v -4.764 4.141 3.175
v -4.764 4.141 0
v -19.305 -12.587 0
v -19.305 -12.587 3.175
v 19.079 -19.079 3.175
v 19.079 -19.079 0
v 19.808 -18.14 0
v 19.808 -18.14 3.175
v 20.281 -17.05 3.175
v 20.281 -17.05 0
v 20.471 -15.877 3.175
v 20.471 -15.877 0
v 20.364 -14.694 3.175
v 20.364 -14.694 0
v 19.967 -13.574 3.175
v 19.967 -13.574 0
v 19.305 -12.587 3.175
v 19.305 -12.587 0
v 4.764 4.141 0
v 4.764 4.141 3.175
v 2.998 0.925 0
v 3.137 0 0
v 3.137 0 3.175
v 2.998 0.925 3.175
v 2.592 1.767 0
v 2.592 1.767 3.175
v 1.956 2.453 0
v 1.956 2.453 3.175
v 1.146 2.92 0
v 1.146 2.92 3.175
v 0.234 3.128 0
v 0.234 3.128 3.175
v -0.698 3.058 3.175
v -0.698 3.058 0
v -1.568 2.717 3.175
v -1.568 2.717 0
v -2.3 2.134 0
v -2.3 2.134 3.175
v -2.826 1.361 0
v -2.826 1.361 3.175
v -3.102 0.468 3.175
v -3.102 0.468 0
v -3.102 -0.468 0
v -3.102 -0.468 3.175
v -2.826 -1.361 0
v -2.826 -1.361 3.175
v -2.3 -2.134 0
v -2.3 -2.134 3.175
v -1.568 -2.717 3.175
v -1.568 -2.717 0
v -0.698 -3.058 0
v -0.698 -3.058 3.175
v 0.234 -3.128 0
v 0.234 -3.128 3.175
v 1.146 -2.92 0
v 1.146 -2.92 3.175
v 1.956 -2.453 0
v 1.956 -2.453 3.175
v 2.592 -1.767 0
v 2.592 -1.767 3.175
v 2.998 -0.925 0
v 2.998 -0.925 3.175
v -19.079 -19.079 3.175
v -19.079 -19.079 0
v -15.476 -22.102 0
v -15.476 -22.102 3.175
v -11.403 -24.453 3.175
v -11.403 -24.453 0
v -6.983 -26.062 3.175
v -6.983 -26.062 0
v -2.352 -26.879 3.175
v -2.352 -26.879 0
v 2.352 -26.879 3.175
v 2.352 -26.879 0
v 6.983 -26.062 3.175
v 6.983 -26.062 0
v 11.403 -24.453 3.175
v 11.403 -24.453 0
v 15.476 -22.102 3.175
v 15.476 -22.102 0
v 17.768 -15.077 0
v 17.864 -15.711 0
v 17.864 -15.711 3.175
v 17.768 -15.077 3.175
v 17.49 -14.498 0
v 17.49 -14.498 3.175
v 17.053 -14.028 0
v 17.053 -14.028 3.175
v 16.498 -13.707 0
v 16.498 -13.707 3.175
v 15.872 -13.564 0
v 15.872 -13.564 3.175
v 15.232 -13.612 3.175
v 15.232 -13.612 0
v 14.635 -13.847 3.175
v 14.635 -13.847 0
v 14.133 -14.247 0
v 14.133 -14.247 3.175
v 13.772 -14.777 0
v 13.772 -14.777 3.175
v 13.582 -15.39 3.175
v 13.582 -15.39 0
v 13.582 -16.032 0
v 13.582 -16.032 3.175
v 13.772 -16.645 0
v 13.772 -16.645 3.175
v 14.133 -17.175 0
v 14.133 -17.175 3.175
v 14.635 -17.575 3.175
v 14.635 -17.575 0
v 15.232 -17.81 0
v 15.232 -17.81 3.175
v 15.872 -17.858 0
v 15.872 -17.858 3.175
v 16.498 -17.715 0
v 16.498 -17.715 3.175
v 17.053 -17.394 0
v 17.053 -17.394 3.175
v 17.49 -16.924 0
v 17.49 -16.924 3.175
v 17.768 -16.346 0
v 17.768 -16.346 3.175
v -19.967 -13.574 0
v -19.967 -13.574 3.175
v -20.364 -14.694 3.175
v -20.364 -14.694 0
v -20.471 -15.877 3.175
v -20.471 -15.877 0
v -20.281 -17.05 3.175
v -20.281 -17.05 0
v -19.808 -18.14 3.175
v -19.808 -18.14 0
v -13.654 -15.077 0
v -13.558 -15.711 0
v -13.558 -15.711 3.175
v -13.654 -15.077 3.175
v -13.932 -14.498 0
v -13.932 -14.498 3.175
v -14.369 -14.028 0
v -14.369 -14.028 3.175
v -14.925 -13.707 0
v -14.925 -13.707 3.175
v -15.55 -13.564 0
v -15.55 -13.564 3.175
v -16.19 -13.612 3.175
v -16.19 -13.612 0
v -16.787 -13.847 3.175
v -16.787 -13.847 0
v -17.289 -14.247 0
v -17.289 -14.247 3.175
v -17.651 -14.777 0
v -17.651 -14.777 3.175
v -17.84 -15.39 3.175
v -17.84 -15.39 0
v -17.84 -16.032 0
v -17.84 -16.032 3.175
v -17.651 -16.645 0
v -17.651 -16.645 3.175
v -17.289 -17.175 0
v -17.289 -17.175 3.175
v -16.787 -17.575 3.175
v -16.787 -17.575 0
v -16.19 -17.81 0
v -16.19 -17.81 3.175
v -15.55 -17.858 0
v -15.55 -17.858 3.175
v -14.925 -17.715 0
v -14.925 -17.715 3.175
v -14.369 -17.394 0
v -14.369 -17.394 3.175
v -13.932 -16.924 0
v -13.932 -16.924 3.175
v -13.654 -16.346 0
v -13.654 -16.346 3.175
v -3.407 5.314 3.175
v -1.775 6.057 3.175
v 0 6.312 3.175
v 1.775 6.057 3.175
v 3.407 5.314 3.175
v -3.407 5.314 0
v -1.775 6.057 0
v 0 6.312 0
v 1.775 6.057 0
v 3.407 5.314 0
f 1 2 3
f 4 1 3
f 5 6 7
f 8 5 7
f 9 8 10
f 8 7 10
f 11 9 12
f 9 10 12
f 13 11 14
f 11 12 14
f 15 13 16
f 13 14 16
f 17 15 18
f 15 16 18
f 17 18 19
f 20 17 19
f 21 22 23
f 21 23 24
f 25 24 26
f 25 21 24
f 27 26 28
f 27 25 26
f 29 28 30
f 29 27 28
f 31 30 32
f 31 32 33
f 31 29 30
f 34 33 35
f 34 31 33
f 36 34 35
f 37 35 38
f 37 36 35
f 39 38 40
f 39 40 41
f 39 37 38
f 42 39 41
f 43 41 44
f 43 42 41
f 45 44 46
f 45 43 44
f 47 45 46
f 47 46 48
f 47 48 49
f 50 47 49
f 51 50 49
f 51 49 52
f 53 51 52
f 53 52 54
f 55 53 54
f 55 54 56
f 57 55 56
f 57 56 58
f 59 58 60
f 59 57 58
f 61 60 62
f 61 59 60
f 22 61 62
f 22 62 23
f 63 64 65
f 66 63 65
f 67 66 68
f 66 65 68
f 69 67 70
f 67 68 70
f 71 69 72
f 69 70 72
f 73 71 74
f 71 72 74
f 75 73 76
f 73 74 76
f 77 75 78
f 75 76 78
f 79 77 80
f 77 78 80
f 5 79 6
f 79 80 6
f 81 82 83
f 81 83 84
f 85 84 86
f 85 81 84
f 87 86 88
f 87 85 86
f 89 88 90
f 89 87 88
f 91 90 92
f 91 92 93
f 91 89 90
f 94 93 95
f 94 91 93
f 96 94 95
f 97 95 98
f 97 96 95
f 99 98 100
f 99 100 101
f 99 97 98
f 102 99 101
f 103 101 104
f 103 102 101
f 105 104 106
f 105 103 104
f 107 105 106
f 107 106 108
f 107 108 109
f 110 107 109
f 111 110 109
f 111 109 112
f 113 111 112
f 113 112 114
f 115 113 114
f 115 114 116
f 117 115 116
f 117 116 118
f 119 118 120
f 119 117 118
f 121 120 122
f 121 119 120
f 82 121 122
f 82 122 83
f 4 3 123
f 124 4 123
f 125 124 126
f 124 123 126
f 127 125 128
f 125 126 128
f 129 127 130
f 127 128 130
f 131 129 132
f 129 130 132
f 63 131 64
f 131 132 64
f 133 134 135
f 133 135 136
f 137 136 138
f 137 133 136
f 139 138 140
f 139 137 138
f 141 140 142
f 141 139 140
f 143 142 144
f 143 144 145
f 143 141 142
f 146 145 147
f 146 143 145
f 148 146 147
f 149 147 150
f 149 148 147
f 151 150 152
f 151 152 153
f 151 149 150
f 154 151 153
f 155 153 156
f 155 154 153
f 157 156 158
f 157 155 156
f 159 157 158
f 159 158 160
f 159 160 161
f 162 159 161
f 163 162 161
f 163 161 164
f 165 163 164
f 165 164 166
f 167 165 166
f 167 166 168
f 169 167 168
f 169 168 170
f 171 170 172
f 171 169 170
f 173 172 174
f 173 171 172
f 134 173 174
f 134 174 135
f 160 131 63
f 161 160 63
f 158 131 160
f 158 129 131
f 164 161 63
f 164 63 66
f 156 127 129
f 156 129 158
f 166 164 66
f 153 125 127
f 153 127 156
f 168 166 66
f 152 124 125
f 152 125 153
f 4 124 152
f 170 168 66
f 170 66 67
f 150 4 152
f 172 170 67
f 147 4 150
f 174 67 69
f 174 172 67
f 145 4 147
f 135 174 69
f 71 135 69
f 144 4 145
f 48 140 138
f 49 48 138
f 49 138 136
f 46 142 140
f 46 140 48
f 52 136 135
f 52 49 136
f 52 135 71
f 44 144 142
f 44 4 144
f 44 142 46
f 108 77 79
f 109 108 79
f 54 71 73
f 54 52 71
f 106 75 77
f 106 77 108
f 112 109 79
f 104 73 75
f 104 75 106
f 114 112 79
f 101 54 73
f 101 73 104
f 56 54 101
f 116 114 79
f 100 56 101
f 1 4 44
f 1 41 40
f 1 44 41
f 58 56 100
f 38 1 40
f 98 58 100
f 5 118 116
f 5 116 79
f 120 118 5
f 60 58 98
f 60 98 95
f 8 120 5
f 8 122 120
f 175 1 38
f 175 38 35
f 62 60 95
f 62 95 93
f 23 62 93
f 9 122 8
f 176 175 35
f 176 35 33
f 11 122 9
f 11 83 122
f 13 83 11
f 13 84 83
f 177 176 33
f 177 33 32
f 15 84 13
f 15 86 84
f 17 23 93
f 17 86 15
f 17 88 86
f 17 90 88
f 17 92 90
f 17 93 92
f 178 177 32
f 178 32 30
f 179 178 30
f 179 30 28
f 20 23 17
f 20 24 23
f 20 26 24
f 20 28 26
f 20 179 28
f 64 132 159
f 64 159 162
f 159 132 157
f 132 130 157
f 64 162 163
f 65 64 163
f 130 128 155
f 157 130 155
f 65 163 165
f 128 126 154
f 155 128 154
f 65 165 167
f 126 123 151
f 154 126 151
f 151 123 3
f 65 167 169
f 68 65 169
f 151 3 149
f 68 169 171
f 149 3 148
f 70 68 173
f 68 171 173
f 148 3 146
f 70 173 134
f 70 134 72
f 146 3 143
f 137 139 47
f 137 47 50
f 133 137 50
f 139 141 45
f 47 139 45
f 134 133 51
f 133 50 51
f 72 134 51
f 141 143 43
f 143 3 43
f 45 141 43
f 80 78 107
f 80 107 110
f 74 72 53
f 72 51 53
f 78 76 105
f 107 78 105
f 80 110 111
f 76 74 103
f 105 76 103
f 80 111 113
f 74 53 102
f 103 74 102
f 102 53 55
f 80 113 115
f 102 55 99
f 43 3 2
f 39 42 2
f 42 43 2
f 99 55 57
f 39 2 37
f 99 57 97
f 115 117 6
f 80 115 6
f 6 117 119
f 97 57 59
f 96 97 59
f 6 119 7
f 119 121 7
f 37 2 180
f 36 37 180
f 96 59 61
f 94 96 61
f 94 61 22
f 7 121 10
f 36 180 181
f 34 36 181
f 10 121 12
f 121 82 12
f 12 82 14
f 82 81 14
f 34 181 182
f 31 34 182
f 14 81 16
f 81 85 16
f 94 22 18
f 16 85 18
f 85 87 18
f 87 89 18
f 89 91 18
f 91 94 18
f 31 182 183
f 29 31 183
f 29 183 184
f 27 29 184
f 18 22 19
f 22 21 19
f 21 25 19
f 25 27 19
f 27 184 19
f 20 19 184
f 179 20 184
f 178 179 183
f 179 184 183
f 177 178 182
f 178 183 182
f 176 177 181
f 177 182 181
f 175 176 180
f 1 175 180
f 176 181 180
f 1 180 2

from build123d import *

# Parameters (mm, degrees)
F0_R     = 2.15265
F0_R_2   = 3.1369
F1_DEPTH = 3.175


with BuildPart() as f1:
    # F0 (on Top) → F1 (new body)
    with BuildSketch(Plane.XY):
        with BuildLine():
            Line((19.305298, -12.586502), (4.763557, 4.141088))
            ThreePointArc((4.763557, 4.141088), (0, 6.3119), (-4.763557, 4.141088))
            Line((-4.763557, 4.141088), (-19.305298, -12.586502))
            ThreePointArc((-19.305298, -12.586502), (-20.470666, -15.87722), (-19.078661, -19.078661))
            ThreePointArc((-19.078661, -19.078661), (0, -26.981301), (19.078661, -19.078661))
            ThreePointArc((19.078661, -19.078661), (20.470666, -15.87722), (19.305298, -12.586502))
        make_face()
        with Locations((-15.711065, -15.711065)):
            Circle(F0_R, mode=Mode.SUBTRACT)
        with Locations((15.711065, -15.711065)):
            Circle(F0_R, mode=Mode.SUBTRACT)
        Circle(F0_R_2, mode=Mode.SUBTRACT)
    extrude(amount=F1_DEPTH)


solid = f1.part
